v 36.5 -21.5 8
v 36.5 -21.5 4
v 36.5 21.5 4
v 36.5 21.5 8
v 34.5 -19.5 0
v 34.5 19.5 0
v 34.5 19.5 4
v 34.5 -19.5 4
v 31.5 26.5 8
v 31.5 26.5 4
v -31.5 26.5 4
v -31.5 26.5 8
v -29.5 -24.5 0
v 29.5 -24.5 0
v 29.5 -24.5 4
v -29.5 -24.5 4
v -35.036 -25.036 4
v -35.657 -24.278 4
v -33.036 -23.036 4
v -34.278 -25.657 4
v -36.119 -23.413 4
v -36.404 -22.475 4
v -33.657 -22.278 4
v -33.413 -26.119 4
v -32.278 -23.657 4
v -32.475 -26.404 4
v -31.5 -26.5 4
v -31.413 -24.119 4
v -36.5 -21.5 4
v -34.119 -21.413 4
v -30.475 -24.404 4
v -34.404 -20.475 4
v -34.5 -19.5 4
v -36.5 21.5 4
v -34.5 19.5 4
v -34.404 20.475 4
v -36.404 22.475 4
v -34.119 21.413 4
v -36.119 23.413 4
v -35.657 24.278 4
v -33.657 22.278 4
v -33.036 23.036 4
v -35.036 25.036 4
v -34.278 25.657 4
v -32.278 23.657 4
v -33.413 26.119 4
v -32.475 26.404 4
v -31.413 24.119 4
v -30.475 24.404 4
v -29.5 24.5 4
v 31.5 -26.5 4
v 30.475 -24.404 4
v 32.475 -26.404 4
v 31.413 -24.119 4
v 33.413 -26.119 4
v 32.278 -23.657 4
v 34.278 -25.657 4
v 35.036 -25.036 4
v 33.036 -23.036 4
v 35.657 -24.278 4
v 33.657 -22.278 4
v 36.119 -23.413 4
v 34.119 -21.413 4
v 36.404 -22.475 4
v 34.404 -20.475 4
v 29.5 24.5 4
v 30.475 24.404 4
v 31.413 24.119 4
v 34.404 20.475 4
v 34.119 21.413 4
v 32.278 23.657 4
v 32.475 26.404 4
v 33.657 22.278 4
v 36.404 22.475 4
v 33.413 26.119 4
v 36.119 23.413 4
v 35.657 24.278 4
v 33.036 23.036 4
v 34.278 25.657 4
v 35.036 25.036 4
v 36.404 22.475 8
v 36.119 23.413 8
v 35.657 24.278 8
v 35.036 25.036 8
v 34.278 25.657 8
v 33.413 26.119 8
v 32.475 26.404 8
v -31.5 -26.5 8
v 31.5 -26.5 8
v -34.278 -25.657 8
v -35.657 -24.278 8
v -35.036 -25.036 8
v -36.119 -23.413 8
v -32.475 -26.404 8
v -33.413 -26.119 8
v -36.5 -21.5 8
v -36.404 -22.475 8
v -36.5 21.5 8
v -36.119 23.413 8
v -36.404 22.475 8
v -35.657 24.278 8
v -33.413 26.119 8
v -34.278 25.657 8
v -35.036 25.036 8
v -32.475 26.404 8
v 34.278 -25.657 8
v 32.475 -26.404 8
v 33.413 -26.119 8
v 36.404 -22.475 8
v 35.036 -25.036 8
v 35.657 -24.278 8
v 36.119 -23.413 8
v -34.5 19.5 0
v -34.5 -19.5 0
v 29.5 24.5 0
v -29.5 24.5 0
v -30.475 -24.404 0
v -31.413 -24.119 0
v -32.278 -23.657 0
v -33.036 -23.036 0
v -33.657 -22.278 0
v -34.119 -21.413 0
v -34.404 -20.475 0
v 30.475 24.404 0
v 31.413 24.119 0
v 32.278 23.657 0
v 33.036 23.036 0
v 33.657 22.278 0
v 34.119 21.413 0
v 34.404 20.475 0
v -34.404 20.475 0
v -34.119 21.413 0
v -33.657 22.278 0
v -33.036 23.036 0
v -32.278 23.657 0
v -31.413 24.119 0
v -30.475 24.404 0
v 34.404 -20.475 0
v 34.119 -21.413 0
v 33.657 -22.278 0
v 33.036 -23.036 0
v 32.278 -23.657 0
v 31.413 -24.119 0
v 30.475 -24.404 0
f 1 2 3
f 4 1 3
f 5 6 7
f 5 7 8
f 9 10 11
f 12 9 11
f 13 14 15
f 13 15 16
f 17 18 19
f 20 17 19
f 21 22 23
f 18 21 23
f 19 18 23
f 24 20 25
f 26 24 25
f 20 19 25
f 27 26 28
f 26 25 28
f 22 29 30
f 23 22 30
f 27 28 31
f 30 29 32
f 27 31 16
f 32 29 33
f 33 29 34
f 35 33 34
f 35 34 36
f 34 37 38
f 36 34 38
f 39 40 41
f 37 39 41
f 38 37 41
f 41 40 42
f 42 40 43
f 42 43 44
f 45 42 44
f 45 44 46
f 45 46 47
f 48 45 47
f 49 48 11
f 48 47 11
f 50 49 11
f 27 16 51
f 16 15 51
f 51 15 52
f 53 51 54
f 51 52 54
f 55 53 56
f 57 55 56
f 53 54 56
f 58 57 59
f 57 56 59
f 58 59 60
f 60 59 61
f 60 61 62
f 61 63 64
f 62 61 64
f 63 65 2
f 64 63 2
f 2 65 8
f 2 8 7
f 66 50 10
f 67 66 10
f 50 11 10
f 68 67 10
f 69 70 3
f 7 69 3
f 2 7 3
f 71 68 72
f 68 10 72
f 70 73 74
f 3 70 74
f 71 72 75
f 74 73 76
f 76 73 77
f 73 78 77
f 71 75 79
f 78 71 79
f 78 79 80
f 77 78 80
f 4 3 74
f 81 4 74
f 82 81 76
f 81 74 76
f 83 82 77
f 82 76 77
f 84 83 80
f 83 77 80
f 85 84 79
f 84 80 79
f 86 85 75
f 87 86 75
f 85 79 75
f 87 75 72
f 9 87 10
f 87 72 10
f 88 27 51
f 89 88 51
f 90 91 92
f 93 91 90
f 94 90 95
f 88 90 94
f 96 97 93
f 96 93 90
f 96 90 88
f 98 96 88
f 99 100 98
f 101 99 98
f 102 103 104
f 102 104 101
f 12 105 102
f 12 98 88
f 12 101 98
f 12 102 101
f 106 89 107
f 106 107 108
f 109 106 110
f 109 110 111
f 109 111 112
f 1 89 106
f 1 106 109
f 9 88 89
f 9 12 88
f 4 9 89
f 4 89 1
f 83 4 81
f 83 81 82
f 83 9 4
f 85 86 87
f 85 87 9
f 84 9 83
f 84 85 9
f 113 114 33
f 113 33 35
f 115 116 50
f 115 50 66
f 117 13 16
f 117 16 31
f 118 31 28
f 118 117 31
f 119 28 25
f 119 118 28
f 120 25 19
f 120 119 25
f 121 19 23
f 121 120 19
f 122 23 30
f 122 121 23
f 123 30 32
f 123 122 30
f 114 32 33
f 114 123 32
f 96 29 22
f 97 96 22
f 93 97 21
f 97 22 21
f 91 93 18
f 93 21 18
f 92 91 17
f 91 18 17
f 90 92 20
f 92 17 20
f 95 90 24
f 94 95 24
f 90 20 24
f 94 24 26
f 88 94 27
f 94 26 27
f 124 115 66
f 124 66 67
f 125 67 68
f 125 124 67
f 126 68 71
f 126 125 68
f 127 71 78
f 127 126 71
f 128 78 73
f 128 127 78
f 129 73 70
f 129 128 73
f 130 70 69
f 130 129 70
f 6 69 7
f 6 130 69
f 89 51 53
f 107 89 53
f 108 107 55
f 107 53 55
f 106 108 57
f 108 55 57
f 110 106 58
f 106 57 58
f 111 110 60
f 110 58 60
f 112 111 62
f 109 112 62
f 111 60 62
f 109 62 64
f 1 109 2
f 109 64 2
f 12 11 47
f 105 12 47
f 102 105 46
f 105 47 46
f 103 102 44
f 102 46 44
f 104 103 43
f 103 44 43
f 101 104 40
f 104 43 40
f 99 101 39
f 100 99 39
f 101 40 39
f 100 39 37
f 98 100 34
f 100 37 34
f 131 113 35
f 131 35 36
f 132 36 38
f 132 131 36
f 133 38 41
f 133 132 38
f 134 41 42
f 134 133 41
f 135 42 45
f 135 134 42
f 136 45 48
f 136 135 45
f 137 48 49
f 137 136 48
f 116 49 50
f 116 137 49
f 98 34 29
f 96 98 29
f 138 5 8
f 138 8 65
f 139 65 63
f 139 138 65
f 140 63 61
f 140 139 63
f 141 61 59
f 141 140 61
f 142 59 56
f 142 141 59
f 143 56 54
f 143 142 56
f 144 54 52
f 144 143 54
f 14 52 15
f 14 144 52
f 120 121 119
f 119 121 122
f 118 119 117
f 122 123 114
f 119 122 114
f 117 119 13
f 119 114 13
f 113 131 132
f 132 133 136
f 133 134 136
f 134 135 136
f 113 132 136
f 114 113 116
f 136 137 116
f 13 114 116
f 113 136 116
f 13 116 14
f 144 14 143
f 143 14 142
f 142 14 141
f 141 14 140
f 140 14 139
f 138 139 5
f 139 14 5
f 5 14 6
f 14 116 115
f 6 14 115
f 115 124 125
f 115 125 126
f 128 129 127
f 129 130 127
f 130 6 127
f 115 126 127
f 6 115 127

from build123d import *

# Parameters (mm, degrees)
F1_DEPTH = 8
F2_DEPTH = 8
F3_DEPTH = 4


with BuildPart() as f1:
    # F0 (on Top) → F1 (new body)
    with BuildSketch(Plane.XY):
        with BuildLine():
            Line((31.5, 26.5), (-31.5, 26.5))
            ThreePointArc((-31.5, 26.5), (-35.0355339059, 25.0355339059), (-36.5, 21.5))
            Line((-36.5, 21.5), (-36.5, -21.5))
            ThreePointArc((-36.5, -21.5), (-35.0355339059, -25.0355339059), (-31.5, -26.5))
            Line((-31.5, -26.5), (31.5, -26.5))
            ThreePointArc((31.5, -26.5), (35.0355339059, -25.0355339059), (36.5, -21.5))
            Line((36.5, -21.5), (36.5, 21.5))
            ThreePointArc((36.5, 21.5), (35.0355339059, 25.0355339059), (31.5, 26.5))
        make_face()
        with BuildLine():
            ThreePointArc((-34.5, 19.5), (-33.0355339059, 23.0355339059), (-29.5, 24.5))
            Line((-29.5, 24.5), (29.5, 24.5))
            ThreePointArc((29.5, 24.5), (33.0355339059, 23.0355339059), (34.5, 19.5))
            Line((34.5, 19.5), (34.5, -19.5))
            ThreePointArc((34.5, -19.5), (33.0355339059, -23.0355339059), (29.5, -24.5))
            Line((29.5, -24.5), (-29.5, -24.5))
            ThreePointArc((-29.5, -24.5), (-33.0355339059, -23.0355339059), (-34.5, -19.5))
            Line((-34.5, -19.5), (-34.5, 19.5))
        make_face(mode=Mode.SUBTRACT)
        with BuildLine():
            Line((29.5, 24.5), (-29.5, 24.5))
            ThreePointArc((-29.5, 24.5), (-33.0355339059, 23.0355339059), (-34.5, 19.5))
            Line((-34.5, 19.5), (-34.5, -19.5))
            ThreePointArc((-34.5, -19.5), (-33.0355339059, -23.0355339059), (-29.5, -24.5))
            Line((-29.5, -24.5), (29.5, -24.5))
            ThreePointArc((29.5, -24.5), (33.0355339059, -23.0355339059), (34.5, -19.5))
            Line((34.5, -19.5), (34.5, 19.5))
            ThreePointArc((34.5, 19.5), (33.0355339059, 23.0355339059), (29.5, 24.5))
        make_face()
    extrude(amount=F1_DEPTH)

    # F0 (on Top) → F2 (join)
    with BuildSketch(Plane.XY):
        with BuildLine():
            Line((31.5, 26.5), (-31.5, 26.5))
            ThreePointArc((-31.5, 26.5), (-35.0355339059, 25.0355339059), (-36.5, 21.5))
            Line((-36.5, 21.5), (-36.5, -21.5))
            ThreePointArc((-36.5, -21.5), (-35.0355339059, -25.0355339059), (-31.5, -26.5))
            Line((-31.5, -26.5), (31.5, -26.5))
            ThreePointArc((31.5, -26.5), (35.0355339059, -25.0355339059), (36.5, -21.5))
            Line((36.5, -21.5), (36.5, 21.5))
            ThreePointArc((36.5, 21.5), (35.0355339059, 25.0355339059), (31.5, 26.5))
        make_face()
        with BuildLine():
            ThreePointArc((-34.5, 19.5), (-33.0355339059, 23.0355339059), (-29.5, 24.5))
            Line((-29.5, 24.5), (29.5, 24.5))
            ThreePointArc((29.5, 24.5), (33.0355339059, 23.0355339059), (34.5, 19.5))
            Line((34.5, 19.5), (34.5, -19.5))
            ThreePointArc((34.5, -19.5), (33.0355339059, -23.0355339059), (29.5, -24.5))
            Line((29.5, -24.5), (-29.5, -24.5))
            ThreePointArc((-29.5, -24.5), (-33.0355339059, -23.0355339059), (-34.5, -19.5))
            Line((-34.5, -19.5), (-34.5, 19.5))
        make_face(mode=Mode.SUBTRACT)
    extrude(amount=F2_DEPTH)

    # F0 (on Top) → F3 (cut)
    with BuildSketch(Plane.XY):
        with BuildLine():
            Line((31.5, 26.5), (-31.5, 26.5))
            ThreePointArc((-31.5, 26.5), (-35.0355339059, 25.0355339059), (-36.5, 21.5))
            Line((-36.5, 21.5), (-36.5, -21.5))
            ThreePointArc((-36.5, -21.5), (-35.0355339059, -25.0355339059), (-31.5, -26.5))
            Line((-31.5, -26.5), (31.5, -26.5))
            ThreePointArc((31.5, -26.5), (35.0355339059, -25.0355339059), (36.5, -21.5))
            Line((36.5, -21.5), (36.5, 21.5))
            ThreePointArc((36.5, 21.5), (35.0355339059, 25.0355339059), (31.5, 26.5))
        make_face()
        with BuildLine():
            ThreePointArc((-34.5, 19.5), (-33.0355339059, 23.0355339059), (-29.5, 24.5))
            Line((-29.5, 24.5), (29.5, 24.5))
            ThreePointArc((29.5, 24.5), (33.0355339059, 23.0355339059), (34.5, 19.5))
            Line((34.5, 19.5), (34.5, -19.5))
            ThreePointArc((34.5, -19.5), (33.0355339059, -23.0355339059), (29.5, -24.5))
            Line((29.5, -24.5), (-29.5, -24.5))
            ThreePointArc((-29.5, -24.5), (-33.0355339059, -23.0355339059), (-34.5, -19.5))
            Line((-34.5, -19.5), (-34.5, 19.5))
        make_face(mode=Mode.SUBTRACT)
    extrude(amount=F3_DEPTH, mode=Mode.SUBTRACT)


solid = f1.part
